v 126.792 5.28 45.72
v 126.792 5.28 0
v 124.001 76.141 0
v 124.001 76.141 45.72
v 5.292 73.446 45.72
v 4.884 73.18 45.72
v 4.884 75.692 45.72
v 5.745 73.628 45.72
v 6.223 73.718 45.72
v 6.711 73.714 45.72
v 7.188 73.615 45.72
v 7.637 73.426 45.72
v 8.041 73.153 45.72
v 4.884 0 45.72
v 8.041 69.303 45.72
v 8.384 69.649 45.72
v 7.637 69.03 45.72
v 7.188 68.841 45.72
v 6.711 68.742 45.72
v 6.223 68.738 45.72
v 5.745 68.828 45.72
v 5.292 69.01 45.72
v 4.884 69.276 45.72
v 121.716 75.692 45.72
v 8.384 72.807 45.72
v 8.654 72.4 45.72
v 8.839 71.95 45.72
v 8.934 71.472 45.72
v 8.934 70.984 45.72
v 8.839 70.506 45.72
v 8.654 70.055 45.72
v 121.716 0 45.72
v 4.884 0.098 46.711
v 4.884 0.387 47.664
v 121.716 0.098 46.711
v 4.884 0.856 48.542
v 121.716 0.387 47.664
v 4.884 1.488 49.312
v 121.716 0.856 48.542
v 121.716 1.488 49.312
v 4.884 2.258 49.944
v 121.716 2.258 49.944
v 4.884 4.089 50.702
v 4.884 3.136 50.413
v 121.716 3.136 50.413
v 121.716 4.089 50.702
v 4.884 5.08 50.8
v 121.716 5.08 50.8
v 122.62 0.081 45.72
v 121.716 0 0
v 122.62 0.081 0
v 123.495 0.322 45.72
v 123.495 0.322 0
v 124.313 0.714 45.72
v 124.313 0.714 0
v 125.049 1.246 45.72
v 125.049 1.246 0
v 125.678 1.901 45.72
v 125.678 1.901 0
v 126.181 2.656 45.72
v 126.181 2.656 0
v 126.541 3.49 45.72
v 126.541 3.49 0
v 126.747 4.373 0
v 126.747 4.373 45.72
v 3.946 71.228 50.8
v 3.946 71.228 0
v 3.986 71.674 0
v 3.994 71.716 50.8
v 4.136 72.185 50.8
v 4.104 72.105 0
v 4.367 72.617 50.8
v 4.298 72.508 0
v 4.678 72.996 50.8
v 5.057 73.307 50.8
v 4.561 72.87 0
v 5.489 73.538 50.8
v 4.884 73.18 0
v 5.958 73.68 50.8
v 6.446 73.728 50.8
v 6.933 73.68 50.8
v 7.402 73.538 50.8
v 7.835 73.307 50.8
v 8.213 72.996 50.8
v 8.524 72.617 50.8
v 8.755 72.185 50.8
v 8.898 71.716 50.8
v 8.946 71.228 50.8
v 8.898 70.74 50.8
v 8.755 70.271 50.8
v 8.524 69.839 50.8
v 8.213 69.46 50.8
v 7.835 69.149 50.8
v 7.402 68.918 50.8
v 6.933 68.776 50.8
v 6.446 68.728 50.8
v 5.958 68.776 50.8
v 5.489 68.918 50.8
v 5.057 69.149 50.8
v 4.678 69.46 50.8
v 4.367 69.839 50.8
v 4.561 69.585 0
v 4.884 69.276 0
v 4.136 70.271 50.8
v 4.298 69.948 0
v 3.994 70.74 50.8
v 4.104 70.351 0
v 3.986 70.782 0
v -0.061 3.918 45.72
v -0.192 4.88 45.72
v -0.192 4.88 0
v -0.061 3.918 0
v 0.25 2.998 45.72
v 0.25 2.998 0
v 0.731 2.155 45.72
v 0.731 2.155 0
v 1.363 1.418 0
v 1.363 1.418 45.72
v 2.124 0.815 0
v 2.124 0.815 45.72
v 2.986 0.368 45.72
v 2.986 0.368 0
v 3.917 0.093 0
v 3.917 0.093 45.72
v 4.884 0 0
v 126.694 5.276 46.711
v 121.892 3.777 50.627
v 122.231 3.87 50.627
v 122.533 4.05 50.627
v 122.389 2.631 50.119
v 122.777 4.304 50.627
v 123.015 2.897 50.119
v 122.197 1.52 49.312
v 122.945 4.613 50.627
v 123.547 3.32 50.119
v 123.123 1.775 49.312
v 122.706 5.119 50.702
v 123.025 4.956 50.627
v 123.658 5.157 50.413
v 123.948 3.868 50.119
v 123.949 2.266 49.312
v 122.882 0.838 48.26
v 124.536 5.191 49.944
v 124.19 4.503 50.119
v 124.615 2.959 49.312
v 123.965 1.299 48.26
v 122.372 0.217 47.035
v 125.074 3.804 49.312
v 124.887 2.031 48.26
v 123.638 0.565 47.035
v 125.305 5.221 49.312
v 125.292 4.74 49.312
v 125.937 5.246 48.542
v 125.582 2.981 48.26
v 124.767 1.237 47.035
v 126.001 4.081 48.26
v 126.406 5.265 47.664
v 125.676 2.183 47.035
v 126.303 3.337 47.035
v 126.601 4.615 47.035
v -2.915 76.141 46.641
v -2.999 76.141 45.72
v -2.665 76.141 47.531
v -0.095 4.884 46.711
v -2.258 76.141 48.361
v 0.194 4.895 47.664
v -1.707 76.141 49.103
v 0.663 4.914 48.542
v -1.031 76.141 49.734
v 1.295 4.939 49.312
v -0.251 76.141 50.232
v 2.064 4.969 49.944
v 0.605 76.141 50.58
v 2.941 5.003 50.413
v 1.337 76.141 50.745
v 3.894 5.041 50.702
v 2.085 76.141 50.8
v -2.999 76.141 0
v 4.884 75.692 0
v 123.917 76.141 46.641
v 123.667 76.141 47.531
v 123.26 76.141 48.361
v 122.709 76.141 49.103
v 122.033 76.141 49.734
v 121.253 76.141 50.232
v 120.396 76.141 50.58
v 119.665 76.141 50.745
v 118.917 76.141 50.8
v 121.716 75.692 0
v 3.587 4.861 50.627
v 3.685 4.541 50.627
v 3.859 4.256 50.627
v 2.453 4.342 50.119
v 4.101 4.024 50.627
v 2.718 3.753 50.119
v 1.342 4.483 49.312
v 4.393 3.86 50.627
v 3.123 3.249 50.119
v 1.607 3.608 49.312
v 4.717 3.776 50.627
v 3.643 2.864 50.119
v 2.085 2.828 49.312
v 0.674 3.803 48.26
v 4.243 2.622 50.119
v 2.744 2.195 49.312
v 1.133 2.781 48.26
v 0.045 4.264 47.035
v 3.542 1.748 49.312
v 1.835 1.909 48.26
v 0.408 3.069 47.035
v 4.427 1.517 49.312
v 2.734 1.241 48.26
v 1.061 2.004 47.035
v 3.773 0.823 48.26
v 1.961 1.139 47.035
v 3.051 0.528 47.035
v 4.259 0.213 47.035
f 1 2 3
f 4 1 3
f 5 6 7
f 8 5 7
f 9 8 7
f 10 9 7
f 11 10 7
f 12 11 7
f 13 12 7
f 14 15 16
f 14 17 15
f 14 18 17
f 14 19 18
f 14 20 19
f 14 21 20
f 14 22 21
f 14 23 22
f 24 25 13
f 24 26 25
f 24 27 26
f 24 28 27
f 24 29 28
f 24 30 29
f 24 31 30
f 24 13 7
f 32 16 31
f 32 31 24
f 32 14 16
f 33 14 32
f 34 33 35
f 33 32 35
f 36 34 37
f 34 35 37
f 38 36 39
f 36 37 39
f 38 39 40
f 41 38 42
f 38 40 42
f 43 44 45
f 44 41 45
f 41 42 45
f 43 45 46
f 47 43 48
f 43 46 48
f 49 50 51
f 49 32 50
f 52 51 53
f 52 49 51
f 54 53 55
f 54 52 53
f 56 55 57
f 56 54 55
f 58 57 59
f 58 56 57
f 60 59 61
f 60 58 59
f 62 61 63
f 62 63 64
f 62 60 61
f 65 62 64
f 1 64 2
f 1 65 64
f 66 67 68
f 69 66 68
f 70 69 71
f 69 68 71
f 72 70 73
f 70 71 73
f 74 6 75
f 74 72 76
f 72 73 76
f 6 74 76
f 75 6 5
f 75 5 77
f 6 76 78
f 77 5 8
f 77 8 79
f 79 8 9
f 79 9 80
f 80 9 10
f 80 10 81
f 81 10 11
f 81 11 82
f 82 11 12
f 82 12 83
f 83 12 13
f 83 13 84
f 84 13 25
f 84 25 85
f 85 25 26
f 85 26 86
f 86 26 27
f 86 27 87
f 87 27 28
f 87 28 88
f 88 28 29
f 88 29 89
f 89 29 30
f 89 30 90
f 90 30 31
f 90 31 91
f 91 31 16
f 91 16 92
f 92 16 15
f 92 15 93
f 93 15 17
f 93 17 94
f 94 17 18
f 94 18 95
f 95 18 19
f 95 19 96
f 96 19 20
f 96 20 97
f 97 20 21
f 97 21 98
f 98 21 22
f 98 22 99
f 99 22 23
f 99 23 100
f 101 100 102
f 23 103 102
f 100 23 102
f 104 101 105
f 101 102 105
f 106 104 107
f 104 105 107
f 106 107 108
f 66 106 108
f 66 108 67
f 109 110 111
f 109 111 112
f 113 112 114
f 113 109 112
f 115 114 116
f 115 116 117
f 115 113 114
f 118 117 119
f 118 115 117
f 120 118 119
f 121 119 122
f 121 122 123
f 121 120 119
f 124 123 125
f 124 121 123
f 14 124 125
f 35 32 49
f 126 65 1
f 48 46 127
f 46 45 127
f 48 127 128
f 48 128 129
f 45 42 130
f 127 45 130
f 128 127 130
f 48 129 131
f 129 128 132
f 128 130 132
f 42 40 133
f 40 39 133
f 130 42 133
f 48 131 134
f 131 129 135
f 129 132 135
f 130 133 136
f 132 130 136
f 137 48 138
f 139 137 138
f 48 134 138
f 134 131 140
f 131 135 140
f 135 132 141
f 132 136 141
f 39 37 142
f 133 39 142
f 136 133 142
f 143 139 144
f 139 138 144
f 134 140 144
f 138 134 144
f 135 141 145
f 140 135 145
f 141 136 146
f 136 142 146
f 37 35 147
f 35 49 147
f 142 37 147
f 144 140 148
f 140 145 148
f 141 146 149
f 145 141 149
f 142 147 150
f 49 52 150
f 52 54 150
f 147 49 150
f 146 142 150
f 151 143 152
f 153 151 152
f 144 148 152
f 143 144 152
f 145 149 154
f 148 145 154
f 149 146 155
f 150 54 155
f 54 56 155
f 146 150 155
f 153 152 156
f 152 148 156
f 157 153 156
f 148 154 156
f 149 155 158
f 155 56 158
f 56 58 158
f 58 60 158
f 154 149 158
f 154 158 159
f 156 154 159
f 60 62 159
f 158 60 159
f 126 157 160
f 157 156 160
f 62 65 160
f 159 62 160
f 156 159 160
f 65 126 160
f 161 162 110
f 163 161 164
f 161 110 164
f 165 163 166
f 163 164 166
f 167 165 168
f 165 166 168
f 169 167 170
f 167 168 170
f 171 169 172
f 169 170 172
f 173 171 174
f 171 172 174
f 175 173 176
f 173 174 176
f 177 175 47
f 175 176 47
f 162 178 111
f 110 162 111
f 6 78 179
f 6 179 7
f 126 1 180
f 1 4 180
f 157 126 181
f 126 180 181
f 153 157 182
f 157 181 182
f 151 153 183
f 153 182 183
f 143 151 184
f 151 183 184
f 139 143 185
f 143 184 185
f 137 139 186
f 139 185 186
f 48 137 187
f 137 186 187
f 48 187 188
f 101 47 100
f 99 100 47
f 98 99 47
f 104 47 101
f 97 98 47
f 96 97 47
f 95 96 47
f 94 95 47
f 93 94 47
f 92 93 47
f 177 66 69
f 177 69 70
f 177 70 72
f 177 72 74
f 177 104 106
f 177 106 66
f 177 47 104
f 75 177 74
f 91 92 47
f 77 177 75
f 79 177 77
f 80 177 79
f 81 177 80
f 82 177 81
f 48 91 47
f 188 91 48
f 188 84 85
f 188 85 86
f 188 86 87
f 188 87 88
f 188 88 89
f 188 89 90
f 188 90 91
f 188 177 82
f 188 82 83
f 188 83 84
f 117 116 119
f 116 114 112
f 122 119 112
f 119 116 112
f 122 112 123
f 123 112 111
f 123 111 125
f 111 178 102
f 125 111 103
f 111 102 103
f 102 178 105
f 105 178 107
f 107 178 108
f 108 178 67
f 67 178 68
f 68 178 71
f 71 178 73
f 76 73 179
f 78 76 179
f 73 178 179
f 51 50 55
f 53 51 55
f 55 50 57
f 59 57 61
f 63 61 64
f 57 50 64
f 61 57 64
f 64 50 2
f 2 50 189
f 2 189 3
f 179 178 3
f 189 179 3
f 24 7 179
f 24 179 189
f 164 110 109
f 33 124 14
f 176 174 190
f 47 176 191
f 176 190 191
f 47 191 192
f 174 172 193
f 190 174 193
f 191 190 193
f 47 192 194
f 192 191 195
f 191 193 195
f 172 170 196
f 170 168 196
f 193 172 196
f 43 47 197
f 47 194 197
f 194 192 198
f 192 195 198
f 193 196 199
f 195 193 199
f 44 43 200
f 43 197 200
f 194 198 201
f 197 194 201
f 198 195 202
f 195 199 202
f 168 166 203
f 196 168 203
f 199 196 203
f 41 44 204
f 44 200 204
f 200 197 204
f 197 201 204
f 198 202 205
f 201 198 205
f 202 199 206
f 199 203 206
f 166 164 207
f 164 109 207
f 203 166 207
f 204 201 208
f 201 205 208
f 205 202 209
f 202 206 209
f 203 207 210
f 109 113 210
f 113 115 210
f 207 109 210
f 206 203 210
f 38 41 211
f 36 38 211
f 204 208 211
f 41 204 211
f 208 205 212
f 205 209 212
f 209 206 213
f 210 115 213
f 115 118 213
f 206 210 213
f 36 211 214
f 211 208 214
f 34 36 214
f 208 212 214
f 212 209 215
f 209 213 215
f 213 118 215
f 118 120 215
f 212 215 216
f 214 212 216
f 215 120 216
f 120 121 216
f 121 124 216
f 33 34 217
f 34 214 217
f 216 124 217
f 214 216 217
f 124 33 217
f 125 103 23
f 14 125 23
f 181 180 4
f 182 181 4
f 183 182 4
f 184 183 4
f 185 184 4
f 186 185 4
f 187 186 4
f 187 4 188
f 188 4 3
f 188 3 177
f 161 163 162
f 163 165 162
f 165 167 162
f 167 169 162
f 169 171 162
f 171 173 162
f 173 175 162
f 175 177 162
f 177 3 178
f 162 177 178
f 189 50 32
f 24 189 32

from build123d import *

# Parameters (mm, degrees)
F1_DEPTH  = 50.8
F2_R      = 5.08
F1_FACE_W = 116.832122
F1_FACE_H = 45.72
F3_DEPTH  = 75.692
F5_D      = 5


with BuildPart() as f1:
    # F0 (on Top) → F1 (new body)
    with BuildSketch(Plane.XY):
        Polygon((-2.999169, 76.140955), (0, 0), (127, 0), (124.000831, 76.140955), align=None)
    extrude(amount=F1_DEPTH)

    # F2
    f2_edges = [f1.edges().sort_by_distance(p)[0] for p in [
        (63.5, 0, 50.8),
        (125.500415, 38.070477, 50.8),
        (127, 0, 25.4),
        (0, 0, 25.4),
        (-1.499585, 38.070477, 50.8),
    ]]
    fillet(f2_edges, radius=F2_R)

    # F1_face (on face) → F3 (cut)
    with BuildSketch(Plane(origin=(63.2999, 0, 22.86), x_dir=(1, 0, 0), z_dir=(0, -1, 0))):
        Rectangle(F1_FACE_W, F1_FACE_H)
    extrude(amount=-F3_DEPTH, mode=Mode.SUBTRACT)

    # F5 (through all)
    with Locations(Plane.XY.offset(50.8)):
        with Locations((6.445575, 71.227975)):
            Hole(F5_D / 2)


solid = f1.part
